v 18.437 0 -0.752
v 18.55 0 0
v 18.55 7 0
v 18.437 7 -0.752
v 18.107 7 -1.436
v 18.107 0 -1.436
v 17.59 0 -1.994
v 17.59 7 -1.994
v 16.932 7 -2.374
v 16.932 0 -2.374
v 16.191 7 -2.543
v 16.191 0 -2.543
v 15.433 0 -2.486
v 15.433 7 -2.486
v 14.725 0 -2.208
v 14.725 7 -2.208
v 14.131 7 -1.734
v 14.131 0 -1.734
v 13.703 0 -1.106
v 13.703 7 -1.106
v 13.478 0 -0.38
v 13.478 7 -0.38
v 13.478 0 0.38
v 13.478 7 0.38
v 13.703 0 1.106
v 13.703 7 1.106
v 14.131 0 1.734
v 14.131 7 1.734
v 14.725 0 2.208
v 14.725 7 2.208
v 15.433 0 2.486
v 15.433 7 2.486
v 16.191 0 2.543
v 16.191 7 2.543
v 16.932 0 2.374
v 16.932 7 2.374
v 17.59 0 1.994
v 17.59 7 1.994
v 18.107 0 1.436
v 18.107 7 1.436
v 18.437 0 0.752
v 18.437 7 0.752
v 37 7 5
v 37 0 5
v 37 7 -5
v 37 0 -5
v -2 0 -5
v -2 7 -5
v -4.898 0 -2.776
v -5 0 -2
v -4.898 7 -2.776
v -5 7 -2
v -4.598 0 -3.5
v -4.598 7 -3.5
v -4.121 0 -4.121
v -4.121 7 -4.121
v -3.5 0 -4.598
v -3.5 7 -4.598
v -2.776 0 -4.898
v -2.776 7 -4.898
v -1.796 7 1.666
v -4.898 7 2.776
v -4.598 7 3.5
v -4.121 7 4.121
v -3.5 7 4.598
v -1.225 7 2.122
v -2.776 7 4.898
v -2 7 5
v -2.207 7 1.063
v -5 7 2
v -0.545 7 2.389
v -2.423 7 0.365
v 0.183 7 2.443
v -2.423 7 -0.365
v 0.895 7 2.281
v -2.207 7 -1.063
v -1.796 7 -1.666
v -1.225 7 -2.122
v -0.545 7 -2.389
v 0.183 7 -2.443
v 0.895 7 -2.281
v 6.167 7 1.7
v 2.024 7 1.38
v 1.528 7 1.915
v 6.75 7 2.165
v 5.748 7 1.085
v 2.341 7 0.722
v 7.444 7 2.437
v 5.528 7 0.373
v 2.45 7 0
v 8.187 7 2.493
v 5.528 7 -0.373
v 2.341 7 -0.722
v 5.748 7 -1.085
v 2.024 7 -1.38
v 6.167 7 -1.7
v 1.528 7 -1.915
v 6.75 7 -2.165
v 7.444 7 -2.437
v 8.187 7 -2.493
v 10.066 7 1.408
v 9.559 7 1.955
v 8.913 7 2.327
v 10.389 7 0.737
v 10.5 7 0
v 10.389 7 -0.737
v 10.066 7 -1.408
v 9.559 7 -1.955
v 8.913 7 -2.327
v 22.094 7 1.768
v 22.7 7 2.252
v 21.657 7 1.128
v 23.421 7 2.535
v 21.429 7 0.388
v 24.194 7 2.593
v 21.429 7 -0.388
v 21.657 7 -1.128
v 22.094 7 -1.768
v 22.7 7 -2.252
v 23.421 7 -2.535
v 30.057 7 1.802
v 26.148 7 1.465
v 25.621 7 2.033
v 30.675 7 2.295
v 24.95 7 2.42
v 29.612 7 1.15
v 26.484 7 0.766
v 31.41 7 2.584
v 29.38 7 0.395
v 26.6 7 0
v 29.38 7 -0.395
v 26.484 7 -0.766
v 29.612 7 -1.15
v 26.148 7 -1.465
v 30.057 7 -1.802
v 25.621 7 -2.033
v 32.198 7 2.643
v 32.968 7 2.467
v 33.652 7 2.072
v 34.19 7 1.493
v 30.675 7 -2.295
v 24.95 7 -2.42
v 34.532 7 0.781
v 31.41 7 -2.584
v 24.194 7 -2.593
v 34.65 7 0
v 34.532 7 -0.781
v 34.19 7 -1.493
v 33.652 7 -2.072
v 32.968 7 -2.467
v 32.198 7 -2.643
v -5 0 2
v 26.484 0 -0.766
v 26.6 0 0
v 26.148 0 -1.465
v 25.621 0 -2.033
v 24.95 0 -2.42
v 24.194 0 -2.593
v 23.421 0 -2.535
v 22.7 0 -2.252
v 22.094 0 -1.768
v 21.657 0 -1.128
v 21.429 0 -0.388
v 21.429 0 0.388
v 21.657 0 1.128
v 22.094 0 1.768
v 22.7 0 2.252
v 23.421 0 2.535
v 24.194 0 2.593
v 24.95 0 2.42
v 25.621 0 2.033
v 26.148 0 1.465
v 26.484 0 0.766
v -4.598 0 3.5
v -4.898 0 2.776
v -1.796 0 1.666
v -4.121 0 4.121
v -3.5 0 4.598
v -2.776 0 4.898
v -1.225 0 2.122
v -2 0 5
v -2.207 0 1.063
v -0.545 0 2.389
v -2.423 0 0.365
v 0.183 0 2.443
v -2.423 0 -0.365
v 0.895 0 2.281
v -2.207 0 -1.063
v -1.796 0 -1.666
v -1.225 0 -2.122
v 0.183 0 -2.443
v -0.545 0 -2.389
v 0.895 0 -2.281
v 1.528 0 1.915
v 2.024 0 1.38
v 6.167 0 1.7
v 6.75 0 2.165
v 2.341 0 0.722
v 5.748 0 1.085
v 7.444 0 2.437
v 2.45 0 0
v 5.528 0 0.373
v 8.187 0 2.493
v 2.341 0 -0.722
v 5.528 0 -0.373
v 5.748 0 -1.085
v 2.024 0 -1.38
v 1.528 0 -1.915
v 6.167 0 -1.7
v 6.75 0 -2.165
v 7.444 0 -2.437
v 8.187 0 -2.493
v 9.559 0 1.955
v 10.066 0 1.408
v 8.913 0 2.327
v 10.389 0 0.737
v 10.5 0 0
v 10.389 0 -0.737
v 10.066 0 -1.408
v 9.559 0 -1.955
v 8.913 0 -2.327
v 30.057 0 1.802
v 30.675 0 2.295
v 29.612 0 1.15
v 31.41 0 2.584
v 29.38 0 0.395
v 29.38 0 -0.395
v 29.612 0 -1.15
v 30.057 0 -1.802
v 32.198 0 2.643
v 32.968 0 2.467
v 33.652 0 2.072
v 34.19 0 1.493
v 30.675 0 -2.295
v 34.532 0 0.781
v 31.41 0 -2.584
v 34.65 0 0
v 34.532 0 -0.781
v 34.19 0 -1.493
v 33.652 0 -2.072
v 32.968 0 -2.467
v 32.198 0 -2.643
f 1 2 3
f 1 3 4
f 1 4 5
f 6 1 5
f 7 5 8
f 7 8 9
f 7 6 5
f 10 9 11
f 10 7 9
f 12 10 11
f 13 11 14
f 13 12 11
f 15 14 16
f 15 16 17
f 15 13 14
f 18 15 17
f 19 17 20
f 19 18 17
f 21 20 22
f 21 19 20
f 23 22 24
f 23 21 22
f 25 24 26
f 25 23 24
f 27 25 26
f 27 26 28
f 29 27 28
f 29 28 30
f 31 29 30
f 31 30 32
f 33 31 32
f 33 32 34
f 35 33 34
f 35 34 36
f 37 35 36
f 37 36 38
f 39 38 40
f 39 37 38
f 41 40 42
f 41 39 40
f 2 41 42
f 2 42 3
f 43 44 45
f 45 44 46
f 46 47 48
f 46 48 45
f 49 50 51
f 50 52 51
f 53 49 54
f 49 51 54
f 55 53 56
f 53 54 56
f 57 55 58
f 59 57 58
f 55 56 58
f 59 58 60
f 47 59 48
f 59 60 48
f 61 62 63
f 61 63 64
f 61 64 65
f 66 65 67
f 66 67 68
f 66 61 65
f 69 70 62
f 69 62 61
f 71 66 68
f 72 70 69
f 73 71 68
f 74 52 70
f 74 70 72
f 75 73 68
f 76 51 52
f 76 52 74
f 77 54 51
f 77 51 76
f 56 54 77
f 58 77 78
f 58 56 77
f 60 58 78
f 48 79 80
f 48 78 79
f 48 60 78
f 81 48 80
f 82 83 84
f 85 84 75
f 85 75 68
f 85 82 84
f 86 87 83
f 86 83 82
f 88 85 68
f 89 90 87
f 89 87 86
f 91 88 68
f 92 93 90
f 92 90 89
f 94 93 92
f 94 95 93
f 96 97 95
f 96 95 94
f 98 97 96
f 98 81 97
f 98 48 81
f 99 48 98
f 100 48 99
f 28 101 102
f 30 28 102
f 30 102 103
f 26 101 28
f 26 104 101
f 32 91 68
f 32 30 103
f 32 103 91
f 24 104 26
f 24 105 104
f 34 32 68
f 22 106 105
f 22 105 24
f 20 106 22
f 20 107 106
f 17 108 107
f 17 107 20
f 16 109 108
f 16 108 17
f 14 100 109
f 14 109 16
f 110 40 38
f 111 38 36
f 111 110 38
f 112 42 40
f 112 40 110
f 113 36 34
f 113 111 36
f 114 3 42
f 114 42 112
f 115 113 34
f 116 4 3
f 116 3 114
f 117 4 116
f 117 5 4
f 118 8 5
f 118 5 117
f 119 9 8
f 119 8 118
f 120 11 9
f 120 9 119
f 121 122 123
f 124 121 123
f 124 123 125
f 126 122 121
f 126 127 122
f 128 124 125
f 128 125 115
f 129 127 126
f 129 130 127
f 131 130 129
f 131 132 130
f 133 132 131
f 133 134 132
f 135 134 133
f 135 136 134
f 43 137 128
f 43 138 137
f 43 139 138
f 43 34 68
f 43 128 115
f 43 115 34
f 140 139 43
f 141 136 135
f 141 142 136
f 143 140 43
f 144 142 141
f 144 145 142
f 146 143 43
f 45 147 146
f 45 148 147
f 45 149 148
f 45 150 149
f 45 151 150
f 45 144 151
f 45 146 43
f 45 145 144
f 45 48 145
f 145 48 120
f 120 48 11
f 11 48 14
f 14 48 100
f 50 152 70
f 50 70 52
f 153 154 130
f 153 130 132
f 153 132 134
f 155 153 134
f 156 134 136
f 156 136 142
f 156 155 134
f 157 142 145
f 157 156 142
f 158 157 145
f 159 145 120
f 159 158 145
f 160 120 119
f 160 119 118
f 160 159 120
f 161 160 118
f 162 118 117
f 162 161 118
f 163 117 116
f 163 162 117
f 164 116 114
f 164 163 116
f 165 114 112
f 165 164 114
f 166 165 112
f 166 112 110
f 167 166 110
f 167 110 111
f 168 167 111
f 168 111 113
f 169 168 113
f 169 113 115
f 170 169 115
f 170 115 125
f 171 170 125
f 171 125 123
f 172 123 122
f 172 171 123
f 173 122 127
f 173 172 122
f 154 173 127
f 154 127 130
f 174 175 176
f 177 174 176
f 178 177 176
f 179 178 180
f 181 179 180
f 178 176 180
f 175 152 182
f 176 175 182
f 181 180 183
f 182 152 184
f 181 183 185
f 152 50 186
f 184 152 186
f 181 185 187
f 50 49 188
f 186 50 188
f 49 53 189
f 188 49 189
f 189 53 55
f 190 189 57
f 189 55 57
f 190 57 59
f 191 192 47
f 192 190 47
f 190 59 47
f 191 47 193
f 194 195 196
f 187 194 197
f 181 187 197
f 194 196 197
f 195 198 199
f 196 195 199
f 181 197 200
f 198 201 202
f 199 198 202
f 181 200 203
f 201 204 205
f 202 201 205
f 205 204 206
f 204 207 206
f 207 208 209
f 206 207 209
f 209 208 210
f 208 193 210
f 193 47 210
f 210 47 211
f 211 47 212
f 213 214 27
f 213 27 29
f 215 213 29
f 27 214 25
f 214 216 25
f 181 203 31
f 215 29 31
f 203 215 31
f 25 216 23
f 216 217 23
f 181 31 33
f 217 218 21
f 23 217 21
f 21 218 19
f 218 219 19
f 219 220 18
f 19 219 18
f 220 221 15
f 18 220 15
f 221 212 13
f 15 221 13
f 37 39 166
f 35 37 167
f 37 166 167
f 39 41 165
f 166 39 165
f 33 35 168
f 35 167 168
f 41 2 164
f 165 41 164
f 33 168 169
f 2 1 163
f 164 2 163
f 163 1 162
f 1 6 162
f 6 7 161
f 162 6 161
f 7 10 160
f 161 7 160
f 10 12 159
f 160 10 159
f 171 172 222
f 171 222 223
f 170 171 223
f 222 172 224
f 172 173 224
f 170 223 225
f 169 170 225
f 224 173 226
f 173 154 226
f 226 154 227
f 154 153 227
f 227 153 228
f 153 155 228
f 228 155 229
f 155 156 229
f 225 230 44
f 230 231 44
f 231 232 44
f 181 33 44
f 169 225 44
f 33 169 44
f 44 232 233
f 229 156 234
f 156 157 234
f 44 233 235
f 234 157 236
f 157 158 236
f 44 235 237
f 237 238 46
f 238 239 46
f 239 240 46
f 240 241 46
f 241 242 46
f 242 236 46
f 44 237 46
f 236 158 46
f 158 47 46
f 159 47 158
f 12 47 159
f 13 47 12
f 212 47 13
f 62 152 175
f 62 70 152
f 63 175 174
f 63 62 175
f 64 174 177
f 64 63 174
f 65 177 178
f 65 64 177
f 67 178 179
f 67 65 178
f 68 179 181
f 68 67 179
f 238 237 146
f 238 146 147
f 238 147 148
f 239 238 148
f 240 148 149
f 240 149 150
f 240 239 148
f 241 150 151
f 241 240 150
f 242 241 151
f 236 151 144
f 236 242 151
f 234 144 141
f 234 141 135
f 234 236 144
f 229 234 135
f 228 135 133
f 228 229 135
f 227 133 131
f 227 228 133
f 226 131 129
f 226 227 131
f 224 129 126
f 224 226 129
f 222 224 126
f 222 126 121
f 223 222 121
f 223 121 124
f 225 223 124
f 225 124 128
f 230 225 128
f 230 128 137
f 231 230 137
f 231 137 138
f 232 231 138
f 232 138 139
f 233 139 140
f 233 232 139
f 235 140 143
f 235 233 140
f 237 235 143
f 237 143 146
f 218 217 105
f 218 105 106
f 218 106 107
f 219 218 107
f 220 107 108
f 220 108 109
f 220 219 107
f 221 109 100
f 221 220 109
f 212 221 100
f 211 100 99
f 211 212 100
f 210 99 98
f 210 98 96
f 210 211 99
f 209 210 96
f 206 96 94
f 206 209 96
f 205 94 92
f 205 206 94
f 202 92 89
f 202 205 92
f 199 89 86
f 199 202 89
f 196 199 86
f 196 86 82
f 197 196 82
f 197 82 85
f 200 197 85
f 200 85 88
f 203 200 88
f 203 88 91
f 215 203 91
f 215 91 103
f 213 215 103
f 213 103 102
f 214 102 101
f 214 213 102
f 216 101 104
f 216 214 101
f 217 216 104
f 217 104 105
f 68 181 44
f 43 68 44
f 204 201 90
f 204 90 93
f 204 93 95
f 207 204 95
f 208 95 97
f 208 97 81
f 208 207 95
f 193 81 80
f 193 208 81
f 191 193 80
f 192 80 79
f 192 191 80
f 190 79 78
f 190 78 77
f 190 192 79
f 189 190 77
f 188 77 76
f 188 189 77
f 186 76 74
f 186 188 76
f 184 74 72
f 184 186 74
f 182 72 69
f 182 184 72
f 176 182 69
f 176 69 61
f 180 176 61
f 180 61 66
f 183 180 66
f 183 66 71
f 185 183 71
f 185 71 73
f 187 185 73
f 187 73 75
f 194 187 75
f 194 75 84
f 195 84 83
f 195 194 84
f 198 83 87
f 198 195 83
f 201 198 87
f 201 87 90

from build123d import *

# Parameters (mm, degrees)
SKETCH1_W           = 42
SKETCH1_H           = 10
SKETCH1_R           = 2.45
SKETCH1_R_2         = 2.5
SKETCH1_R_3         = 2.55
SKETCH1_R_4         = 2.6
SKETCH1_R_5         = 2.65
BOSS_EXTRUDE1_DEPTH = 7
FILLET2_R           = 3


with BuildPart() as part:
    # Sketch1 → Boss-Extrude1 (new body)
    with BuildSketch(Plane(origin=(0, 0, 0), x_dir=(1, 0, 0), z_dir=(0, 1, 0))):
        with Locations((16, 0)):
            Rectangle(SKETCH1_W, SKETCH1_H)
        Circle(SKETCH1_R, mode=Mode.SUBTRACT)
        with Locations((8, 0)):
            Circle(SKETCH1_R_2, mode=Mode.SUBTRACT)
        with Locations((16, 0)):
            Circle(SKETCH1_R_3, mode=Mode.SUBTRACT)
        with Locations((24, 0)):
            Circle(SKETCH1_R_4, mode=Mode.SUBTRACT)
        with Locations((32, 0)):
            Circle(SKETCH1_R_5, mode=Mode.SUBTRACT)
    extrude(amount=BOSS_EXTRUDE1_DEPTH)

    # Fillet2
    fillet2_edges = [part.edges().sort_by_distance(p)[0] for p in [
        (-5, 3.5, 5),
        (-5, 3.5, -5),
    ]]
    fillet(fillet2_edges, radius=FILLET2_R)


solid = part.part
